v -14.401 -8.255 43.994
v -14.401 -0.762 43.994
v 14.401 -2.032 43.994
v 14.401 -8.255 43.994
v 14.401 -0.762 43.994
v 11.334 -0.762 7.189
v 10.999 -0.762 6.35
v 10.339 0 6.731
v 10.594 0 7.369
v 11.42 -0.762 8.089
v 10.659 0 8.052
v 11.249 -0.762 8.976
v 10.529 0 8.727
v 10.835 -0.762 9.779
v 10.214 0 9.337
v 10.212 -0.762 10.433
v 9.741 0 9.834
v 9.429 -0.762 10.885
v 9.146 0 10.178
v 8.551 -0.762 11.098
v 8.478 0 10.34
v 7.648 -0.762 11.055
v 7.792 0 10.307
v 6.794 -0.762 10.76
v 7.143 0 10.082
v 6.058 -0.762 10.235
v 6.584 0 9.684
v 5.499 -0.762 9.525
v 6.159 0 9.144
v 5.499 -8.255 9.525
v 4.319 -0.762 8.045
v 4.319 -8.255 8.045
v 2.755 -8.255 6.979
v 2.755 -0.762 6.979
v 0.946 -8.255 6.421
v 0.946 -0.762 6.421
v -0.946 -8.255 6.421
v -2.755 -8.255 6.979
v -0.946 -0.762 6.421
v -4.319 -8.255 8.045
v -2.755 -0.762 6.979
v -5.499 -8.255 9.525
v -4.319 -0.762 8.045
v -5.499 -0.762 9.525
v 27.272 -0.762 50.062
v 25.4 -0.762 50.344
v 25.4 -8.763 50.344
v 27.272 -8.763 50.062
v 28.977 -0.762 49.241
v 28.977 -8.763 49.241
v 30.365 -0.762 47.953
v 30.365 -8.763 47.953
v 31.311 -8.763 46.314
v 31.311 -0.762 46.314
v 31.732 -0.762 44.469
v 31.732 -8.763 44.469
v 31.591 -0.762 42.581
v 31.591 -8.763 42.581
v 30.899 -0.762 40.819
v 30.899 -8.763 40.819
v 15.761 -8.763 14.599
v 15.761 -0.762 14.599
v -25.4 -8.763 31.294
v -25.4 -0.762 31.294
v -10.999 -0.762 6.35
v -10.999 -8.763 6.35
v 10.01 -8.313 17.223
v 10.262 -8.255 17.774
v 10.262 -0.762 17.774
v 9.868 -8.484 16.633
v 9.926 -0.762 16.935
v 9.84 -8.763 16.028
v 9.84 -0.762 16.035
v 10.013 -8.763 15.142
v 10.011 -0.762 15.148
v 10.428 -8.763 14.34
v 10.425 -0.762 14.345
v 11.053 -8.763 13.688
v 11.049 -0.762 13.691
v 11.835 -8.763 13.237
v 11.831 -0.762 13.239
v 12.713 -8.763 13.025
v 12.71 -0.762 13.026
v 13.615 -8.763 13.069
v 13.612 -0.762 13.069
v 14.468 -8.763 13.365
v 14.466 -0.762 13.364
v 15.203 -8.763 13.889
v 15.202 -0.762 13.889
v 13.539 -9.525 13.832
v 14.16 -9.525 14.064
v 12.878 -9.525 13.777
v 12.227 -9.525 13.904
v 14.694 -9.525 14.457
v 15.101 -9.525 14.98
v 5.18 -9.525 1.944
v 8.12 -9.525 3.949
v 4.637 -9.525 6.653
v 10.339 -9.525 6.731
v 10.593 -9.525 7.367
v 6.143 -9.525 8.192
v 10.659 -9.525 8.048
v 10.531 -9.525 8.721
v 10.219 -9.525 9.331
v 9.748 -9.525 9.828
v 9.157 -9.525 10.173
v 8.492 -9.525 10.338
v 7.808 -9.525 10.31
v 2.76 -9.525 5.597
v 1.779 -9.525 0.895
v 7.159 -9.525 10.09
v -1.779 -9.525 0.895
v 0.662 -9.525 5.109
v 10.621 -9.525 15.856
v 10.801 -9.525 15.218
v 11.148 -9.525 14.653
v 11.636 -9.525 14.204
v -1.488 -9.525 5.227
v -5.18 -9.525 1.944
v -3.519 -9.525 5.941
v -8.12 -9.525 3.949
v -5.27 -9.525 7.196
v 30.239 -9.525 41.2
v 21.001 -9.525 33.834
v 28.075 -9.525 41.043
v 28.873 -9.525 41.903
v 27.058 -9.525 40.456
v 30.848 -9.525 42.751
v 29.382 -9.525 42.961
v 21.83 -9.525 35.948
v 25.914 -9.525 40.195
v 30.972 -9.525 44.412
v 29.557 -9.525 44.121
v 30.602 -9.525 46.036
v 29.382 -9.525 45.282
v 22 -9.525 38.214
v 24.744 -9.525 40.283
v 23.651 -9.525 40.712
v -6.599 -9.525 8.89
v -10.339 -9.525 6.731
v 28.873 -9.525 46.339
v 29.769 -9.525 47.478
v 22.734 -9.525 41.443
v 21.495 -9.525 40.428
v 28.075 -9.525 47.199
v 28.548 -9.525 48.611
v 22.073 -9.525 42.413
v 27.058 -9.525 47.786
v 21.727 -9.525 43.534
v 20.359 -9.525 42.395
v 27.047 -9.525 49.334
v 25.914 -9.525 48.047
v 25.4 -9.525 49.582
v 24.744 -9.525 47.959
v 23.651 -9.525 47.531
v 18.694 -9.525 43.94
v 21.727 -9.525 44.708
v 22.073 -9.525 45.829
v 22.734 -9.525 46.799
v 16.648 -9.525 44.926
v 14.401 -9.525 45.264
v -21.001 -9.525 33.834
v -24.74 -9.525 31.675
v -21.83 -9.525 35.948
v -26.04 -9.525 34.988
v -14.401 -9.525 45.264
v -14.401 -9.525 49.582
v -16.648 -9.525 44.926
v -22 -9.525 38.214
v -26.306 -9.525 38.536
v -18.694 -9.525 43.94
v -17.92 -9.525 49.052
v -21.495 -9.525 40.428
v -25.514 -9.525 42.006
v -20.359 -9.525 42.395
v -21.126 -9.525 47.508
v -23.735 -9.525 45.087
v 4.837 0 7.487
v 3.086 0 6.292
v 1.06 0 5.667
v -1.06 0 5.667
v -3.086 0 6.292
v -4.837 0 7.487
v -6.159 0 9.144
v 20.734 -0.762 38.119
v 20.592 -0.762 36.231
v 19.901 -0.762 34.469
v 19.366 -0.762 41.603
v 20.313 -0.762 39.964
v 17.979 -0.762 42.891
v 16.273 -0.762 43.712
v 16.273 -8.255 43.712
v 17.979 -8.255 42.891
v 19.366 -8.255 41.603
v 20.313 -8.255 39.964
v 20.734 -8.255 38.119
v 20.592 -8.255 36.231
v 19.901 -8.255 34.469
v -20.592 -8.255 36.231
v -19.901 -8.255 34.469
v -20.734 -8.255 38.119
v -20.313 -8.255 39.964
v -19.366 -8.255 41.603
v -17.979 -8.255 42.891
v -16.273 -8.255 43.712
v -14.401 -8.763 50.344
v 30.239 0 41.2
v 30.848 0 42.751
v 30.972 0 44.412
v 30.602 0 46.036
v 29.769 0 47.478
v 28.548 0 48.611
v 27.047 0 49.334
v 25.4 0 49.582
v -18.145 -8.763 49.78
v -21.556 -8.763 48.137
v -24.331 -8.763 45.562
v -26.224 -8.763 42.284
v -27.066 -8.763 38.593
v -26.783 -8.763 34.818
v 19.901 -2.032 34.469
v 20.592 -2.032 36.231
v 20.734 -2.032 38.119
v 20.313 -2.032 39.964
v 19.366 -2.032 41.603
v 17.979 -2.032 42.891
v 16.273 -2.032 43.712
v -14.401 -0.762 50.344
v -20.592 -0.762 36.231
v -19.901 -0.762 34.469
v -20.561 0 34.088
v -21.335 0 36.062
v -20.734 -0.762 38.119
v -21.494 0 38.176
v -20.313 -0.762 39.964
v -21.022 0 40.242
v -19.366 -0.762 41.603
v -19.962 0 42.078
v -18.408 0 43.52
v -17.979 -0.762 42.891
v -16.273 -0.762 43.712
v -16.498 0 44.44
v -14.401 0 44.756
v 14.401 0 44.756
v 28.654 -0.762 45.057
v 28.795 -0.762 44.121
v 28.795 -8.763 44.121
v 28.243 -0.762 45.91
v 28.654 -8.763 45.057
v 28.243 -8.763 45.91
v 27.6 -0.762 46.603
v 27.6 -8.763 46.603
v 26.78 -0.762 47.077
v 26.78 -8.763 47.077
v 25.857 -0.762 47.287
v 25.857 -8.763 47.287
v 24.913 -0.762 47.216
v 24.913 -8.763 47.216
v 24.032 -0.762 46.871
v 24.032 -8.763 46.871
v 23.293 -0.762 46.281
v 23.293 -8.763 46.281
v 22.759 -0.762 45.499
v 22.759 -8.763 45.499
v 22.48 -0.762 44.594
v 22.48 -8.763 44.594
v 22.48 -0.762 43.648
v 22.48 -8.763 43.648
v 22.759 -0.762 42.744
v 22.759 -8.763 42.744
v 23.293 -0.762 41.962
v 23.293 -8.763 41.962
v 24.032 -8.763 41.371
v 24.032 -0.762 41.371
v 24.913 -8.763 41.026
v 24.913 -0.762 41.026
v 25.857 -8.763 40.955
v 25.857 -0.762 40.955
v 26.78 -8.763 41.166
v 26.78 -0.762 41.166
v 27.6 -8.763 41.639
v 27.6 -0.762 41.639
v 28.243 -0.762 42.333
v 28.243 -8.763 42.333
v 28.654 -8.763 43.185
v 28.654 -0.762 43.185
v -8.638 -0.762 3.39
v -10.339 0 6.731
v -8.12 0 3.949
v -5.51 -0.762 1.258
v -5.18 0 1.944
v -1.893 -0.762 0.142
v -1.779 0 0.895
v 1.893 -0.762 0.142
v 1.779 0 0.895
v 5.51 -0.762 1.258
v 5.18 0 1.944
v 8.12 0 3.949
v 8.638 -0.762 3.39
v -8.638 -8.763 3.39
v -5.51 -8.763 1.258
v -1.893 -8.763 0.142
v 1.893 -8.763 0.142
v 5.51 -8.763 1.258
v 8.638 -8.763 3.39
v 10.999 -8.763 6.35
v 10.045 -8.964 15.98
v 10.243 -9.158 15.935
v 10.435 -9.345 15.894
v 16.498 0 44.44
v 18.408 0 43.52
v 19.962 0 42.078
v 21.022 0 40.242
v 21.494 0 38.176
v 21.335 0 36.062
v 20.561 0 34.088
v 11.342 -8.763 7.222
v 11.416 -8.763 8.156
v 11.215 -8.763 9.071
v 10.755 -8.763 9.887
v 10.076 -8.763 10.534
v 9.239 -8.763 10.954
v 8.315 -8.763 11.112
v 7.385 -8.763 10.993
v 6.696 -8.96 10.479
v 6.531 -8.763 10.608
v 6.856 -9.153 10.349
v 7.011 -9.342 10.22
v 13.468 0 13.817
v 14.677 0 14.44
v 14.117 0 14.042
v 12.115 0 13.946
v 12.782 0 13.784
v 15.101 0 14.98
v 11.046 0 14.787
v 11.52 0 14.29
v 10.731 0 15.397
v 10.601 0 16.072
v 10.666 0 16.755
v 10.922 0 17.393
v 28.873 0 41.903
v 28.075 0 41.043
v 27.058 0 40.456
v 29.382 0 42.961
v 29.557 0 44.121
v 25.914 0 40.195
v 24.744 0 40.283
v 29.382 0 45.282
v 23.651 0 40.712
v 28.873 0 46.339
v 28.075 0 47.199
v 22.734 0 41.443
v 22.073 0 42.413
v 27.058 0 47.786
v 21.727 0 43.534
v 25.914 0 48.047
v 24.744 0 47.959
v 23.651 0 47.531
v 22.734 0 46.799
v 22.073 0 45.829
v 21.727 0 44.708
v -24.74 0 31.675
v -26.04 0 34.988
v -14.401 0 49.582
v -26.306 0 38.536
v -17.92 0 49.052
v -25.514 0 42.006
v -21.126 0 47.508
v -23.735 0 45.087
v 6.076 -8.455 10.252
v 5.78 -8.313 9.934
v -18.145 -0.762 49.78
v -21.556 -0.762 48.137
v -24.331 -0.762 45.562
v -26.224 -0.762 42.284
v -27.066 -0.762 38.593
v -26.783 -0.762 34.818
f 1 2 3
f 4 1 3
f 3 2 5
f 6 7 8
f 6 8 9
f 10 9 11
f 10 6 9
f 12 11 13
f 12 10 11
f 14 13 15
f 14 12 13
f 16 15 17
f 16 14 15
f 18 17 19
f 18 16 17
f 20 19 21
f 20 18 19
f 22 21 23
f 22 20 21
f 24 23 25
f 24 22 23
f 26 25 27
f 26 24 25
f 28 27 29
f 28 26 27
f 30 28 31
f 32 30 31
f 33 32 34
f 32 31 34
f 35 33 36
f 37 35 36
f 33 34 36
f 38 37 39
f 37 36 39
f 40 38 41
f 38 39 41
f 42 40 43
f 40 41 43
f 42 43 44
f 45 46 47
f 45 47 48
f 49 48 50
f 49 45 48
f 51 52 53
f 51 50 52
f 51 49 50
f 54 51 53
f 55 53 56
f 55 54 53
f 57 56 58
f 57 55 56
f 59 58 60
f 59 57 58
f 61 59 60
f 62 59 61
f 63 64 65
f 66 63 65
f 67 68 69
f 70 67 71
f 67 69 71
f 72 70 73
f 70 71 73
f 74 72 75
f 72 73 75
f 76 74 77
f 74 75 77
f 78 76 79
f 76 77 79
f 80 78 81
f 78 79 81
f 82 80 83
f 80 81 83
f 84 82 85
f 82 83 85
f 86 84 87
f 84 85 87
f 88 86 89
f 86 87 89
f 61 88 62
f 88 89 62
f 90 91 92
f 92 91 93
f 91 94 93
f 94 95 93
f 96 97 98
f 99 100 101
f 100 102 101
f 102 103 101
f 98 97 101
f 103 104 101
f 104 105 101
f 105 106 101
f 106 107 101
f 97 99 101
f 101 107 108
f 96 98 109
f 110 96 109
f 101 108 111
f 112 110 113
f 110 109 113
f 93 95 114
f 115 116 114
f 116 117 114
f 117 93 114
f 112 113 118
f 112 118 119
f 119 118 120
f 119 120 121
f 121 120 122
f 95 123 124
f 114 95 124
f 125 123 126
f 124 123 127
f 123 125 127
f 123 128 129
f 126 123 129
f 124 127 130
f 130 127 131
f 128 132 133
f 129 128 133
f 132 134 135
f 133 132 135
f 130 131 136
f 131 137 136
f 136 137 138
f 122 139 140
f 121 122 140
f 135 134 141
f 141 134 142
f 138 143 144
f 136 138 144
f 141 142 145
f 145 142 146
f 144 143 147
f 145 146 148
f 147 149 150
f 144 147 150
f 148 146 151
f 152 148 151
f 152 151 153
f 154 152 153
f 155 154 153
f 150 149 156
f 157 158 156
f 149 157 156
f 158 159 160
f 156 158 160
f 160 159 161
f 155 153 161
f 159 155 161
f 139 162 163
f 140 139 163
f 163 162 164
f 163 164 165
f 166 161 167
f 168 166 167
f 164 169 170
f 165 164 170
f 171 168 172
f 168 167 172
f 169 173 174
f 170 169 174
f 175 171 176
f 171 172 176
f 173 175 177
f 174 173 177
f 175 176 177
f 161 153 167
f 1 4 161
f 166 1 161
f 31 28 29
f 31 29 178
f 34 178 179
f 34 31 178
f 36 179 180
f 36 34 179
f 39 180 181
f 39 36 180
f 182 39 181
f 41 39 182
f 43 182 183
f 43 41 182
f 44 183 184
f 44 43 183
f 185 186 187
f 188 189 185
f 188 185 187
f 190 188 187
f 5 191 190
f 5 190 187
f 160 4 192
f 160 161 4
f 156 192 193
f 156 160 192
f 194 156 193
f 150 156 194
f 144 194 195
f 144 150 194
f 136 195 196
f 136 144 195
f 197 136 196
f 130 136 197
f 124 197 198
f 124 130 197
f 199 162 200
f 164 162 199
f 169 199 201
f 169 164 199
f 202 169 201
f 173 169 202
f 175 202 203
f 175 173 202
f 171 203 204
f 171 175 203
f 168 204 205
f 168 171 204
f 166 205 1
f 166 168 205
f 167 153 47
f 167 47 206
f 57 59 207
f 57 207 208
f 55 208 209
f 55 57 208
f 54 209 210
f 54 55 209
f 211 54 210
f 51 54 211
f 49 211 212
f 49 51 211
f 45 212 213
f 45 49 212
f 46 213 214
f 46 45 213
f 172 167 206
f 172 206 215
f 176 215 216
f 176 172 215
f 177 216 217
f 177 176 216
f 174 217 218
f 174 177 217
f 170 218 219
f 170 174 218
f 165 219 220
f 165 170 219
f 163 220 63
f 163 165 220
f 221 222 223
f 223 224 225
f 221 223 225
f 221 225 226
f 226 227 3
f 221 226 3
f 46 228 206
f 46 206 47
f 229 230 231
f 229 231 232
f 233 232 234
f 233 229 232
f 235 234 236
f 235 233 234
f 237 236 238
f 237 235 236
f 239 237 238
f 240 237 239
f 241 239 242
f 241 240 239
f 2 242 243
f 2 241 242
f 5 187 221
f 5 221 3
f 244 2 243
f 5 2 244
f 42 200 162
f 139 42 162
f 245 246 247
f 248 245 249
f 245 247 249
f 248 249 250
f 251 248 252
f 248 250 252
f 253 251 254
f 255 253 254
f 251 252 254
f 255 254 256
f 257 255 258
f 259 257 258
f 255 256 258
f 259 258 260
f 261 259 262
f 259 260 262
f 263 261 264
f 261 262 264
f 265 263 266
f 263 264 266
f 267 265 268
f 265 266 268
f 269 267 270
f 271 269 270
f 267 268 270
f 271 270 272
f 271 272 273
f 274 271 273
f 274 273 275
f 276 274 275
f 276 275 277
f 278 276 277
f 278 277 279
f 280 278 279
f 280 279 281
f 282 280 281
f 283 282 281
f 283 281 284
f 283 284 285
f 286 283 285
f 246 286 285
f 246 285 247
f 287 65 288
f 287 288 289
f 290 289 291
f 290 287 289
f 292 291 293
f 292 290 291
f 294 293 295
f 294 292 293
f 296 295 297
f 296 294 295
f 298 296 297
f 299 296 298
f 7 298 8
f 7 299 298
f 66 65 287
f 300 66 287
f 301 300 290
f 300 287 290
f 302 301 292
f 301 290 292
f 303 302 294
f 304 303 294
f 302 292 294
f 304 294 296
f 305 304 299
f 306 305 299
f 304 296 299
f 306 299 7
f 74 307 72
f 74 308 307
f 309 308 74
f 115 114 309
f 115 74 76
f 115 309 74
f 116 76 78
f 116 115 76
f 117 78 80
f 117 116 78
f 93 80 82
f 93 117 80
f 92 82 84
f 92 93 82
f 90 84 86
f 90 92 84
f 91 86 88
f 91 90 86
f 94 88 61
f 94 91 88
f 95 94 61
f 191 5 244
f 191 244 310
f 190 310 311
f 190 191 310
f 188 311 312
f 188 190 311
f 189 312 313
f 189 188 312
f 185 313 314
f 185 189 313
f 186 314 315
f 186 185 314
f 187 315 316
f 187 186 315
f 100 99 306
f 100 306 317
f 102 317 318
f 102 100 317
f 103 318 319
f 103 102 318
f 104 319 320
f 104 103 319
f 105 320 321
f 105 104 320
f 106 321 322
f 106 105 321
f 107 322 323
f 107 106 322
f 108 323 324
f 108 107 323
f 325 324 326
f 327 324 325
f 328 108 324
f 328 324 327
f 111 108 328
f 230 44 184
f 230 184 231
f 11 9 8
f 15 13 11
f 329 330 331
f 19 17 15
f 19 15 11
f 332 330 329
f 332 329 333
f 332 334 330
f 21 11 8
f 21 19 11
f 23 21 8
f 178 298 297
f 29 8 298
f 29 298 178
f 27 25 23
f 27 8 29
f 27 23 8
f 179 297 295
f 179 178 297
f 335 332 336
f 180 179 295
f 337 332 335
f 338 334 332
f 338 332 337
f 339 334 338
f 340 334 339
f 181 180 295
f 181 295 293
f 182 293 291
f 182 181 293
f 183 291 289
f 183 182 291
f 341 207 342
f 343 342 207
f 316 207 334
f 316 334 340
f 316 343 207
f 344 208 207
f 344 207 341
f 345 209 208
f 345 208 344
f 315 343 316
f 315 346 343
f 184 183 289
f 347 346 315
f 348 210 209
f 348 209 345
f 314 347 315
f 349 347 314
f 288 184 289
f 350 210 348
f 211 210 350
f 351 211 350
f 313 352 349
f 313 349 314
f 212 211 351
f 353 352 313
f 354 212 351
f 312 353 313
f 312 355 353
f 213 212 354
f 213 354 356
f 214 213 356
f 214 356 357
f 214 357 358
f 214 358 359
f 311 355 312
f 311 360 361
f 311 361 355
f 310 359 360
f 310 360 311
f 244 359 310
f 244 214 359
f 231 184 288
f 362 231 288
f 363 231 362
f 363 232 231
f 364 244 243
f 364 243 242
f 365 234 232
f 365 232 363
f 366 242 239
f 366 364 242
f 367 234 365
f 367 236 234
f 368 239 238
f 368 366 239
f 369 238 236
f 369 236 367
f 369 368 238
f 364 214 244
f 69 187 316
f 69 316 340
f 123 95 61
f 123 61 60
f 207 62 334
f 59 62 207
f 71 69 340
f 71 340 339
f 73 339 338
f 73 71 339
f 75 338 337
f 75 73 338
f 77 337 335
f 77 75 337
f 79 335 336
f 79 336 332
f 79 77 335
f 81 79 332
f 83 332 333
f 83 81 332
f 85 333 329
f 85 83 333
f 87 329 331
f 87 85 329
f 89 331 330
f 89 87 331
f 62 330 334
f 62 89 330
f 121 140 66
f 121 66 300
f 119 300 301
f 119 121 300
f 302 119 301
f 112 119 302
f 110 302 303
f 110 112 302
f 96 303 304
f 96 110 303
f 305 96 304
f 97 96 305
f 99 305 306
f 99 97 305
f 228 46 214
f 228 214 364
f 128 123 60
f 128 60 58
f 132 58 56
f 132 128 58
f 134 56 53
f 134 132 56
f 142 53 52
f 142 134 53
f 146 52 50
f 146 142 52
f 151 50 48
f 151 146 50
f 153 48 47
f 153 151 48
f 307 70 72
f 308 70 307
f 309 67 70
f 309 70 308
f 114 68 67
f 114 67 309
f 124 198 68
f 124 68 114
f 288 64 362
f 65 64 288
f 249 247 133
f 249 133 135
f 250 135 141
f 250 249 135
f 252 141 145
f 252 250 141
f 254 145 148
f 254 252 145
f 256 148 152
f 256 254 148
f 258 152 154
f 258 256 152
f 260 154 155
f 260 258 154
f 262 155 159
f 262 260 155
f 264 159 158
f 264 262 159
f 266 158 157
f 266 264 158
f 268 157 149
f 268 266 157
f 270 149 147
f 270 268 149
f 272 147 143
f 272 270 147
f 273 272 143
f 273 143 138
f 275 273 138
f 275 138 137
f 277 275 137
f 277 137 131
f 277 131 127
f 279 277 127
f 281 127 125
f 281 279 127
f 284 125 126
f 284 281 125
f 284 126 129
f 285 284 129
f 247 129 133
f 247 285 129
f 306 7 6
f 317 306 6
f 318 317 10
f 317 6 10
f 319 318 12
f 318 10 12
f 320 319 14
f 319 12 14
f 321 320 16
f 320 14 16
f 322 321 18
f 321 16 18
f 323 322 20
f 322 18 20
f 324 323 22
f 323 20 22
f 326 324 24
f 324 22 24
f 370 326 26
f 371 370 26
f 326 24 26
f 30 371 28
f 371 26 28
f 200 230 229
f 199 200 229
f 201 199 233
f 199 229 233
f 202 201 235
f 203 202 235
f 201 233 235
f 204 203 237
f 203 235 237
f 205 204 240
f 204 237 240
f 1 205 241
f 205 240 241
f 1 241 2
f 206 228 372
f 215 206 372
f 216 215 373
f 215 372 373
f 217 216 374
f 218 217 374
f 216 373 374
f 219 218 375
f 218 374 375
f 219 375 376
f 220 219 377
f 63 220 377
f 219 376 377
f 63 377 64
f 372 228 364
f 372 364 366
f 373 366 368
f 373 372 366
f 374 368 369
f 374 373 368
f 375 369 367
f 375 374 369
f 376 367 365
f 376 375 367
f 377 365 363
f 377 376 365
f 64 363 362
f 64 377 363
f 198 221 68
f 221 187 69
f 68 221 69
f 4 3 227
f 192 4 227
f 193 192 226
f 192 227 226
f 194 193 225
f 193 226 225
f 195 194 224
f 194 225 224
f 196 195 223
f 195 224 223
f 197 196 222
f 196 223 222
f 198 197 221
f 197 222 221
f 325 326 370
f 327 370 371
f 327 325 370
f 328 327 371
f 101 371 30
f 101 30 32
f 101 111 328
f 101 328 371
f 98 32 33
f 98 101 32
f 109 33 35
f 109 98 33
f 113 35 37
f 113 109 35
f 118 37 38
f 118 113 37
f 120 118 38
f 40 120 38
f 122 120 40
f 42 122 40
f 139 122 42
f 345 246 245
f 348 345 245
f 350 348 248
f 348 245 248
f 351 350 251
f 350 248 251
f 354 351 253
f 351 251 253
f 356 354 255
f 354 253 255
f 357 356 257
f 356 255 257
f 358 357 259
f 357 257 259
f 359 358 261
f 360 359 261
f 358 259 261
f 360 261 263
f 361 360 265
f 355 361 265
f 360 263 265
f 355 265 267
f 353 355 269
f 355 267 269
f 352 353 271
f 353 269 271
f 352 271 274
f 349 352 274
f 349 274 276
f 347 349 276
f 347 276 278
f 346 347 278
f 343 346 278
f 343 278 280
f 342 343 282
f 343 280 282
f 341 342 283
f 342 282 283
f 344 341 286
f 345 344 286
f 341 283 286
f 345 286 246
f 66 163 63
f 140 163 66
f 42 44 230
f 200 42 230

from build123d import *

# Parameters (mm, degrees)
F1_DEPTH     = 9.525
F3_T1_DEPTH  = 28.8029547439
F3_T3_DEPTH  = 22.5439921386
F3_T5_DEPTH  = 28.8029547439
F3_T8_ANGLE  = 120
F3_T10_ANGLE = 120
F3_T12_ANGLE = 149.490366343
F5_DEPTH     = 9.525
F6_SIZE      = 0.762
F8_R         = 3.175
F9_DEPTH     = 9.526
F10_SIZE     = 0.762
F12_DEPTH    = 1.27


# Not quite as in the source:
# - a fillet or chamfer that OpenCascade refuses, or shapes differently, is made with other operations: its cross-section is extruded or revolved along the edge and cut away or added
# - a feature of the source that left no trace in its solid (it failed there, or was rolled back) is left out
# - a feature names something its author has since deleted; it is built from what else it names


with BuildPart() as f1:
    # F0 (on Front) → F1 (new body)
    with BuildSketch(Plane.XZ):
        with BuildLine():
            Line((-14.4014773719, 43.9940905122), (14.4014773719, 43.9940905122))
            ThreePointArc((14.4014773719, 43.9940905122), (19.900738686, 40.8190905122), (19.900738686, 34.4690905122))
            Line((19.900738686, 34.4690905122), (10.261761314, 17.773891971))
            ThreePointArc((10.261761314, 17.773891971), (11.423891971, 13.436761314), (15.7610226281, 14.598891971))
            Line((15.7610226281, 14.598891971), (25.4, 31.2940905122))
            ThreePointArc((25.4, 31.2940905122), (25.4, 43.9940905122), (14.4014773719, 50.3440905122))
            Line((14.4014773719, 50.3440905122), (-14.4014773719, 50.3440905122))
            ThreePointArc((-14.4014773719, 50.3440905122), (-25.4, 43.9940905122), (-25.4, 31.2940905122))
            Line((-25.4, 31.2940905122), (-10.9985226281, 6.35))
            ThreePointArc((-10.9985226281, 6.35), (0, 0), (10.9985226281, 6.35))
            ThreePointArc((10.9985226281, 6.35), (9.836391971, 10.687130657), (5.499261314, 9.525))
            ThreePointArc((5.499261314, 9.525), (0, 6.35), (-5.499261314, 9.525))
            Line((-5.499261314, 9.525), (-19.900738686, 34.4690905122))
            ThreePointArc((-19.900738686, 34.4690905122), (-19.900738686, 40.8190905122), (-14.4014773719, 43.9940905122))
        make_face()
    extrude(amount=F1_DEPTH)

    # F3: chamfer of 1.27 on 6 edges, made by hand

    # F3_s2 → F3_t1 (cut)
    with BuildSketch(Plane.YZ.offset(-14.4014773719)):
        Polygon((-8.255, 43.9940905122), (-9.525, 45.2640905122), (-9.525, 43.9940905122), align=None)
    extrude(amount=F3_T1_DEPTH, mode=Mode.SUBTRACT)

    # F3_s4 → F3_t3 (cut)
    with BuildSketch(Plane(origin=(19.900738686, 0, 34.4690905122), x_dir=(0, 1, 0), z_dir=(-0.5, 0, -0.8660254038))):
        Polygon((-8.255, 0), (-9.525, 1.27), (-9.525, 0), align=None)
    extrude(amount=F3_T3_DEPTH, mode=Mode.SUBTRACT)

    # F3_s6 → F3_t5 (cut)
    with BuildSketch(Plane(origin=(-5.499261314, 0, 9.525), x_dir=(0, 1, 0), z_dir=(-0.5, 0, 0.8660254038))):
        Polygon((-8.255, 0), (-9.525, 1.27), (-9.525, 0), align=None)
    extrude(amount=F3_T5_DEPTH, mode=Mode.SUBTRACT)

    # F3_s7 → F3_t8 (revolve, cut)
    with BuildSketch(Plane(origin=(-19.900738686, 0, 34.4690905122), x_dir=(0, 1, 0), z_dir=(0.5, 0, -0.8660254038))):
        Polygon((-8.255, 0), (-9.525, -1.27), (-9.525, 0), align=None)
    revolve(axis=Axis((-14.4014773719, -9.525, 37.6440905122), (0, 1, 0)), revolution_arc=F3_T8_ANGLE, mode=Mode.SUBTRACT)

    # F3_s9 → F3_t10 (revolve, cut)
    with BuildSketch(Plane.YZ.offset(14.4014773719)):
        Polygon((-8.255, 43.9940905122), (-9.525, 45.2640905122), (-9.525, 43.9940905122), align=None)
    revolve(axis=Axis((14.4014773719, -9.525, 37.6440905122), (0, 1, 0)), revolution_arc=F3_T10_ANGLE, mode=Mode.SUBTRACT)

    # F3_s11 → F3_t12 (revolve, cut)
    with BuildSketch(Plane(origin=(0.1129578151, 0, 12.698995238), x_dir=(0, 1, 0), z_dir=(0.008894668, 0, 0.9999604417))):
        Polygon((-8.255, -6.2370377163), (-9.525, -7.5070377163), (-9.525, -6.2370377163), align=None)
    revolve(axis=Axis((0, -9.525, 12.7), (0, 1, 0)), revolution_arc=F3_T12_ANGLE, mode=Mode.SUBTRACT)

    # F4 (on face) → F5 (join, through all)
    with BuildSketch(Plane(origin=(0, 0, 0), x_dir=(-1, 0, 0), z_dir=(0, 1, 0))):
        with BuildLine():
            Line((-30.899261314, 40.8190905122), (-25.4, 31.2940905122))
            ThreePointArc((-25.4, 31.2940905122), (-25.4, 43.9940905122), (-14.4014773719, 50.3440905122))
            Line((-14.4014773719, 50.3440905122), (-25.4, 50.3440905122))
            ThreePointArc((-25.4, 50.3440905122), (-30.899261314, 47.1690905122), (-30.899261314, 40.8190905122))
        make_face()
    extrude(amount=-F5_DEPTH)

    # F6
    f6_edges = [f1.edges().sort_by_distance(p)[0] for p in [
        (12.821161, -9.525, 13.017096),
        (23.330142, -9.525, 27.708991),
        (30.899261, -9.525, 47.169091),
        (5.499261, -9.525, 50.344091),
        (-25.4, -9.525, 43.994091),
        (-18.199261, -9.525, 18.822045),
        (0, -9.525, 0),
        (10.76839, -9.525, 9.869534),
        (9.836392, 0, 10.687131),
        (0, 0, 0),
        (-18.199261, 0, 18.822045),
        (-25.4, 0, 43.994091),
        (5.499261, 0, 50.344091),
        (30.899261, 0, 47.169091),
        (23.330142, 0, 27.708991),
        (11.423892, 0, 13.436761),
        (15.08125, 0, 26.121491),
        (19.900739, 0, 40.819091),
        (0, 0, 43.994091),
        (-19.900739, 0, 40.819091),
        (-12.7, 0, 21.997045),
        (0, 0, 6.35),
    ]]
    chamfer(f6_edges, length=F6_SIZE)

    # F8 (on face) → F9 (cut, through all)
    with BuildSketch(Plane.XZ.offset(9.525)):
        with Locations((25.6199704526, 44.1210905122)):
            Circle(F8_R)
    extrude(amount=-F9_DEPTH, mode=Mode.SUBTRACT)

    # F10
    f10_edges = [f1.edges().sort_by_distance(p)[0] for p in [
        (22.44497, -9.525, 44.121091),
        (28.79497, -4.7625, 44.121091),
        (22.44497, 0, 44.121091),
    ]]
    chamfer(f10_edges, length=F10_SIZE)

    # F11 (on offset) → F12 (join)
    with BuildSketch(Plane(origin=(0, -0.762, 0), x_dir=(-1, 0, 0), z_dir=(0, 1, 0))):
        with BuildLine():
            Line((-19.900738686, 34.4690905122), (-14.4014773719, 43.9940905122))
            ThreePointArc((-14.4014773719, 43.9940905122), (-19.900738686, 40.8190905122), (-19.900738686, 34.4690905122))
        make_face()
    extrude(amount=-F12_DEPTH)


solid = f1.part
